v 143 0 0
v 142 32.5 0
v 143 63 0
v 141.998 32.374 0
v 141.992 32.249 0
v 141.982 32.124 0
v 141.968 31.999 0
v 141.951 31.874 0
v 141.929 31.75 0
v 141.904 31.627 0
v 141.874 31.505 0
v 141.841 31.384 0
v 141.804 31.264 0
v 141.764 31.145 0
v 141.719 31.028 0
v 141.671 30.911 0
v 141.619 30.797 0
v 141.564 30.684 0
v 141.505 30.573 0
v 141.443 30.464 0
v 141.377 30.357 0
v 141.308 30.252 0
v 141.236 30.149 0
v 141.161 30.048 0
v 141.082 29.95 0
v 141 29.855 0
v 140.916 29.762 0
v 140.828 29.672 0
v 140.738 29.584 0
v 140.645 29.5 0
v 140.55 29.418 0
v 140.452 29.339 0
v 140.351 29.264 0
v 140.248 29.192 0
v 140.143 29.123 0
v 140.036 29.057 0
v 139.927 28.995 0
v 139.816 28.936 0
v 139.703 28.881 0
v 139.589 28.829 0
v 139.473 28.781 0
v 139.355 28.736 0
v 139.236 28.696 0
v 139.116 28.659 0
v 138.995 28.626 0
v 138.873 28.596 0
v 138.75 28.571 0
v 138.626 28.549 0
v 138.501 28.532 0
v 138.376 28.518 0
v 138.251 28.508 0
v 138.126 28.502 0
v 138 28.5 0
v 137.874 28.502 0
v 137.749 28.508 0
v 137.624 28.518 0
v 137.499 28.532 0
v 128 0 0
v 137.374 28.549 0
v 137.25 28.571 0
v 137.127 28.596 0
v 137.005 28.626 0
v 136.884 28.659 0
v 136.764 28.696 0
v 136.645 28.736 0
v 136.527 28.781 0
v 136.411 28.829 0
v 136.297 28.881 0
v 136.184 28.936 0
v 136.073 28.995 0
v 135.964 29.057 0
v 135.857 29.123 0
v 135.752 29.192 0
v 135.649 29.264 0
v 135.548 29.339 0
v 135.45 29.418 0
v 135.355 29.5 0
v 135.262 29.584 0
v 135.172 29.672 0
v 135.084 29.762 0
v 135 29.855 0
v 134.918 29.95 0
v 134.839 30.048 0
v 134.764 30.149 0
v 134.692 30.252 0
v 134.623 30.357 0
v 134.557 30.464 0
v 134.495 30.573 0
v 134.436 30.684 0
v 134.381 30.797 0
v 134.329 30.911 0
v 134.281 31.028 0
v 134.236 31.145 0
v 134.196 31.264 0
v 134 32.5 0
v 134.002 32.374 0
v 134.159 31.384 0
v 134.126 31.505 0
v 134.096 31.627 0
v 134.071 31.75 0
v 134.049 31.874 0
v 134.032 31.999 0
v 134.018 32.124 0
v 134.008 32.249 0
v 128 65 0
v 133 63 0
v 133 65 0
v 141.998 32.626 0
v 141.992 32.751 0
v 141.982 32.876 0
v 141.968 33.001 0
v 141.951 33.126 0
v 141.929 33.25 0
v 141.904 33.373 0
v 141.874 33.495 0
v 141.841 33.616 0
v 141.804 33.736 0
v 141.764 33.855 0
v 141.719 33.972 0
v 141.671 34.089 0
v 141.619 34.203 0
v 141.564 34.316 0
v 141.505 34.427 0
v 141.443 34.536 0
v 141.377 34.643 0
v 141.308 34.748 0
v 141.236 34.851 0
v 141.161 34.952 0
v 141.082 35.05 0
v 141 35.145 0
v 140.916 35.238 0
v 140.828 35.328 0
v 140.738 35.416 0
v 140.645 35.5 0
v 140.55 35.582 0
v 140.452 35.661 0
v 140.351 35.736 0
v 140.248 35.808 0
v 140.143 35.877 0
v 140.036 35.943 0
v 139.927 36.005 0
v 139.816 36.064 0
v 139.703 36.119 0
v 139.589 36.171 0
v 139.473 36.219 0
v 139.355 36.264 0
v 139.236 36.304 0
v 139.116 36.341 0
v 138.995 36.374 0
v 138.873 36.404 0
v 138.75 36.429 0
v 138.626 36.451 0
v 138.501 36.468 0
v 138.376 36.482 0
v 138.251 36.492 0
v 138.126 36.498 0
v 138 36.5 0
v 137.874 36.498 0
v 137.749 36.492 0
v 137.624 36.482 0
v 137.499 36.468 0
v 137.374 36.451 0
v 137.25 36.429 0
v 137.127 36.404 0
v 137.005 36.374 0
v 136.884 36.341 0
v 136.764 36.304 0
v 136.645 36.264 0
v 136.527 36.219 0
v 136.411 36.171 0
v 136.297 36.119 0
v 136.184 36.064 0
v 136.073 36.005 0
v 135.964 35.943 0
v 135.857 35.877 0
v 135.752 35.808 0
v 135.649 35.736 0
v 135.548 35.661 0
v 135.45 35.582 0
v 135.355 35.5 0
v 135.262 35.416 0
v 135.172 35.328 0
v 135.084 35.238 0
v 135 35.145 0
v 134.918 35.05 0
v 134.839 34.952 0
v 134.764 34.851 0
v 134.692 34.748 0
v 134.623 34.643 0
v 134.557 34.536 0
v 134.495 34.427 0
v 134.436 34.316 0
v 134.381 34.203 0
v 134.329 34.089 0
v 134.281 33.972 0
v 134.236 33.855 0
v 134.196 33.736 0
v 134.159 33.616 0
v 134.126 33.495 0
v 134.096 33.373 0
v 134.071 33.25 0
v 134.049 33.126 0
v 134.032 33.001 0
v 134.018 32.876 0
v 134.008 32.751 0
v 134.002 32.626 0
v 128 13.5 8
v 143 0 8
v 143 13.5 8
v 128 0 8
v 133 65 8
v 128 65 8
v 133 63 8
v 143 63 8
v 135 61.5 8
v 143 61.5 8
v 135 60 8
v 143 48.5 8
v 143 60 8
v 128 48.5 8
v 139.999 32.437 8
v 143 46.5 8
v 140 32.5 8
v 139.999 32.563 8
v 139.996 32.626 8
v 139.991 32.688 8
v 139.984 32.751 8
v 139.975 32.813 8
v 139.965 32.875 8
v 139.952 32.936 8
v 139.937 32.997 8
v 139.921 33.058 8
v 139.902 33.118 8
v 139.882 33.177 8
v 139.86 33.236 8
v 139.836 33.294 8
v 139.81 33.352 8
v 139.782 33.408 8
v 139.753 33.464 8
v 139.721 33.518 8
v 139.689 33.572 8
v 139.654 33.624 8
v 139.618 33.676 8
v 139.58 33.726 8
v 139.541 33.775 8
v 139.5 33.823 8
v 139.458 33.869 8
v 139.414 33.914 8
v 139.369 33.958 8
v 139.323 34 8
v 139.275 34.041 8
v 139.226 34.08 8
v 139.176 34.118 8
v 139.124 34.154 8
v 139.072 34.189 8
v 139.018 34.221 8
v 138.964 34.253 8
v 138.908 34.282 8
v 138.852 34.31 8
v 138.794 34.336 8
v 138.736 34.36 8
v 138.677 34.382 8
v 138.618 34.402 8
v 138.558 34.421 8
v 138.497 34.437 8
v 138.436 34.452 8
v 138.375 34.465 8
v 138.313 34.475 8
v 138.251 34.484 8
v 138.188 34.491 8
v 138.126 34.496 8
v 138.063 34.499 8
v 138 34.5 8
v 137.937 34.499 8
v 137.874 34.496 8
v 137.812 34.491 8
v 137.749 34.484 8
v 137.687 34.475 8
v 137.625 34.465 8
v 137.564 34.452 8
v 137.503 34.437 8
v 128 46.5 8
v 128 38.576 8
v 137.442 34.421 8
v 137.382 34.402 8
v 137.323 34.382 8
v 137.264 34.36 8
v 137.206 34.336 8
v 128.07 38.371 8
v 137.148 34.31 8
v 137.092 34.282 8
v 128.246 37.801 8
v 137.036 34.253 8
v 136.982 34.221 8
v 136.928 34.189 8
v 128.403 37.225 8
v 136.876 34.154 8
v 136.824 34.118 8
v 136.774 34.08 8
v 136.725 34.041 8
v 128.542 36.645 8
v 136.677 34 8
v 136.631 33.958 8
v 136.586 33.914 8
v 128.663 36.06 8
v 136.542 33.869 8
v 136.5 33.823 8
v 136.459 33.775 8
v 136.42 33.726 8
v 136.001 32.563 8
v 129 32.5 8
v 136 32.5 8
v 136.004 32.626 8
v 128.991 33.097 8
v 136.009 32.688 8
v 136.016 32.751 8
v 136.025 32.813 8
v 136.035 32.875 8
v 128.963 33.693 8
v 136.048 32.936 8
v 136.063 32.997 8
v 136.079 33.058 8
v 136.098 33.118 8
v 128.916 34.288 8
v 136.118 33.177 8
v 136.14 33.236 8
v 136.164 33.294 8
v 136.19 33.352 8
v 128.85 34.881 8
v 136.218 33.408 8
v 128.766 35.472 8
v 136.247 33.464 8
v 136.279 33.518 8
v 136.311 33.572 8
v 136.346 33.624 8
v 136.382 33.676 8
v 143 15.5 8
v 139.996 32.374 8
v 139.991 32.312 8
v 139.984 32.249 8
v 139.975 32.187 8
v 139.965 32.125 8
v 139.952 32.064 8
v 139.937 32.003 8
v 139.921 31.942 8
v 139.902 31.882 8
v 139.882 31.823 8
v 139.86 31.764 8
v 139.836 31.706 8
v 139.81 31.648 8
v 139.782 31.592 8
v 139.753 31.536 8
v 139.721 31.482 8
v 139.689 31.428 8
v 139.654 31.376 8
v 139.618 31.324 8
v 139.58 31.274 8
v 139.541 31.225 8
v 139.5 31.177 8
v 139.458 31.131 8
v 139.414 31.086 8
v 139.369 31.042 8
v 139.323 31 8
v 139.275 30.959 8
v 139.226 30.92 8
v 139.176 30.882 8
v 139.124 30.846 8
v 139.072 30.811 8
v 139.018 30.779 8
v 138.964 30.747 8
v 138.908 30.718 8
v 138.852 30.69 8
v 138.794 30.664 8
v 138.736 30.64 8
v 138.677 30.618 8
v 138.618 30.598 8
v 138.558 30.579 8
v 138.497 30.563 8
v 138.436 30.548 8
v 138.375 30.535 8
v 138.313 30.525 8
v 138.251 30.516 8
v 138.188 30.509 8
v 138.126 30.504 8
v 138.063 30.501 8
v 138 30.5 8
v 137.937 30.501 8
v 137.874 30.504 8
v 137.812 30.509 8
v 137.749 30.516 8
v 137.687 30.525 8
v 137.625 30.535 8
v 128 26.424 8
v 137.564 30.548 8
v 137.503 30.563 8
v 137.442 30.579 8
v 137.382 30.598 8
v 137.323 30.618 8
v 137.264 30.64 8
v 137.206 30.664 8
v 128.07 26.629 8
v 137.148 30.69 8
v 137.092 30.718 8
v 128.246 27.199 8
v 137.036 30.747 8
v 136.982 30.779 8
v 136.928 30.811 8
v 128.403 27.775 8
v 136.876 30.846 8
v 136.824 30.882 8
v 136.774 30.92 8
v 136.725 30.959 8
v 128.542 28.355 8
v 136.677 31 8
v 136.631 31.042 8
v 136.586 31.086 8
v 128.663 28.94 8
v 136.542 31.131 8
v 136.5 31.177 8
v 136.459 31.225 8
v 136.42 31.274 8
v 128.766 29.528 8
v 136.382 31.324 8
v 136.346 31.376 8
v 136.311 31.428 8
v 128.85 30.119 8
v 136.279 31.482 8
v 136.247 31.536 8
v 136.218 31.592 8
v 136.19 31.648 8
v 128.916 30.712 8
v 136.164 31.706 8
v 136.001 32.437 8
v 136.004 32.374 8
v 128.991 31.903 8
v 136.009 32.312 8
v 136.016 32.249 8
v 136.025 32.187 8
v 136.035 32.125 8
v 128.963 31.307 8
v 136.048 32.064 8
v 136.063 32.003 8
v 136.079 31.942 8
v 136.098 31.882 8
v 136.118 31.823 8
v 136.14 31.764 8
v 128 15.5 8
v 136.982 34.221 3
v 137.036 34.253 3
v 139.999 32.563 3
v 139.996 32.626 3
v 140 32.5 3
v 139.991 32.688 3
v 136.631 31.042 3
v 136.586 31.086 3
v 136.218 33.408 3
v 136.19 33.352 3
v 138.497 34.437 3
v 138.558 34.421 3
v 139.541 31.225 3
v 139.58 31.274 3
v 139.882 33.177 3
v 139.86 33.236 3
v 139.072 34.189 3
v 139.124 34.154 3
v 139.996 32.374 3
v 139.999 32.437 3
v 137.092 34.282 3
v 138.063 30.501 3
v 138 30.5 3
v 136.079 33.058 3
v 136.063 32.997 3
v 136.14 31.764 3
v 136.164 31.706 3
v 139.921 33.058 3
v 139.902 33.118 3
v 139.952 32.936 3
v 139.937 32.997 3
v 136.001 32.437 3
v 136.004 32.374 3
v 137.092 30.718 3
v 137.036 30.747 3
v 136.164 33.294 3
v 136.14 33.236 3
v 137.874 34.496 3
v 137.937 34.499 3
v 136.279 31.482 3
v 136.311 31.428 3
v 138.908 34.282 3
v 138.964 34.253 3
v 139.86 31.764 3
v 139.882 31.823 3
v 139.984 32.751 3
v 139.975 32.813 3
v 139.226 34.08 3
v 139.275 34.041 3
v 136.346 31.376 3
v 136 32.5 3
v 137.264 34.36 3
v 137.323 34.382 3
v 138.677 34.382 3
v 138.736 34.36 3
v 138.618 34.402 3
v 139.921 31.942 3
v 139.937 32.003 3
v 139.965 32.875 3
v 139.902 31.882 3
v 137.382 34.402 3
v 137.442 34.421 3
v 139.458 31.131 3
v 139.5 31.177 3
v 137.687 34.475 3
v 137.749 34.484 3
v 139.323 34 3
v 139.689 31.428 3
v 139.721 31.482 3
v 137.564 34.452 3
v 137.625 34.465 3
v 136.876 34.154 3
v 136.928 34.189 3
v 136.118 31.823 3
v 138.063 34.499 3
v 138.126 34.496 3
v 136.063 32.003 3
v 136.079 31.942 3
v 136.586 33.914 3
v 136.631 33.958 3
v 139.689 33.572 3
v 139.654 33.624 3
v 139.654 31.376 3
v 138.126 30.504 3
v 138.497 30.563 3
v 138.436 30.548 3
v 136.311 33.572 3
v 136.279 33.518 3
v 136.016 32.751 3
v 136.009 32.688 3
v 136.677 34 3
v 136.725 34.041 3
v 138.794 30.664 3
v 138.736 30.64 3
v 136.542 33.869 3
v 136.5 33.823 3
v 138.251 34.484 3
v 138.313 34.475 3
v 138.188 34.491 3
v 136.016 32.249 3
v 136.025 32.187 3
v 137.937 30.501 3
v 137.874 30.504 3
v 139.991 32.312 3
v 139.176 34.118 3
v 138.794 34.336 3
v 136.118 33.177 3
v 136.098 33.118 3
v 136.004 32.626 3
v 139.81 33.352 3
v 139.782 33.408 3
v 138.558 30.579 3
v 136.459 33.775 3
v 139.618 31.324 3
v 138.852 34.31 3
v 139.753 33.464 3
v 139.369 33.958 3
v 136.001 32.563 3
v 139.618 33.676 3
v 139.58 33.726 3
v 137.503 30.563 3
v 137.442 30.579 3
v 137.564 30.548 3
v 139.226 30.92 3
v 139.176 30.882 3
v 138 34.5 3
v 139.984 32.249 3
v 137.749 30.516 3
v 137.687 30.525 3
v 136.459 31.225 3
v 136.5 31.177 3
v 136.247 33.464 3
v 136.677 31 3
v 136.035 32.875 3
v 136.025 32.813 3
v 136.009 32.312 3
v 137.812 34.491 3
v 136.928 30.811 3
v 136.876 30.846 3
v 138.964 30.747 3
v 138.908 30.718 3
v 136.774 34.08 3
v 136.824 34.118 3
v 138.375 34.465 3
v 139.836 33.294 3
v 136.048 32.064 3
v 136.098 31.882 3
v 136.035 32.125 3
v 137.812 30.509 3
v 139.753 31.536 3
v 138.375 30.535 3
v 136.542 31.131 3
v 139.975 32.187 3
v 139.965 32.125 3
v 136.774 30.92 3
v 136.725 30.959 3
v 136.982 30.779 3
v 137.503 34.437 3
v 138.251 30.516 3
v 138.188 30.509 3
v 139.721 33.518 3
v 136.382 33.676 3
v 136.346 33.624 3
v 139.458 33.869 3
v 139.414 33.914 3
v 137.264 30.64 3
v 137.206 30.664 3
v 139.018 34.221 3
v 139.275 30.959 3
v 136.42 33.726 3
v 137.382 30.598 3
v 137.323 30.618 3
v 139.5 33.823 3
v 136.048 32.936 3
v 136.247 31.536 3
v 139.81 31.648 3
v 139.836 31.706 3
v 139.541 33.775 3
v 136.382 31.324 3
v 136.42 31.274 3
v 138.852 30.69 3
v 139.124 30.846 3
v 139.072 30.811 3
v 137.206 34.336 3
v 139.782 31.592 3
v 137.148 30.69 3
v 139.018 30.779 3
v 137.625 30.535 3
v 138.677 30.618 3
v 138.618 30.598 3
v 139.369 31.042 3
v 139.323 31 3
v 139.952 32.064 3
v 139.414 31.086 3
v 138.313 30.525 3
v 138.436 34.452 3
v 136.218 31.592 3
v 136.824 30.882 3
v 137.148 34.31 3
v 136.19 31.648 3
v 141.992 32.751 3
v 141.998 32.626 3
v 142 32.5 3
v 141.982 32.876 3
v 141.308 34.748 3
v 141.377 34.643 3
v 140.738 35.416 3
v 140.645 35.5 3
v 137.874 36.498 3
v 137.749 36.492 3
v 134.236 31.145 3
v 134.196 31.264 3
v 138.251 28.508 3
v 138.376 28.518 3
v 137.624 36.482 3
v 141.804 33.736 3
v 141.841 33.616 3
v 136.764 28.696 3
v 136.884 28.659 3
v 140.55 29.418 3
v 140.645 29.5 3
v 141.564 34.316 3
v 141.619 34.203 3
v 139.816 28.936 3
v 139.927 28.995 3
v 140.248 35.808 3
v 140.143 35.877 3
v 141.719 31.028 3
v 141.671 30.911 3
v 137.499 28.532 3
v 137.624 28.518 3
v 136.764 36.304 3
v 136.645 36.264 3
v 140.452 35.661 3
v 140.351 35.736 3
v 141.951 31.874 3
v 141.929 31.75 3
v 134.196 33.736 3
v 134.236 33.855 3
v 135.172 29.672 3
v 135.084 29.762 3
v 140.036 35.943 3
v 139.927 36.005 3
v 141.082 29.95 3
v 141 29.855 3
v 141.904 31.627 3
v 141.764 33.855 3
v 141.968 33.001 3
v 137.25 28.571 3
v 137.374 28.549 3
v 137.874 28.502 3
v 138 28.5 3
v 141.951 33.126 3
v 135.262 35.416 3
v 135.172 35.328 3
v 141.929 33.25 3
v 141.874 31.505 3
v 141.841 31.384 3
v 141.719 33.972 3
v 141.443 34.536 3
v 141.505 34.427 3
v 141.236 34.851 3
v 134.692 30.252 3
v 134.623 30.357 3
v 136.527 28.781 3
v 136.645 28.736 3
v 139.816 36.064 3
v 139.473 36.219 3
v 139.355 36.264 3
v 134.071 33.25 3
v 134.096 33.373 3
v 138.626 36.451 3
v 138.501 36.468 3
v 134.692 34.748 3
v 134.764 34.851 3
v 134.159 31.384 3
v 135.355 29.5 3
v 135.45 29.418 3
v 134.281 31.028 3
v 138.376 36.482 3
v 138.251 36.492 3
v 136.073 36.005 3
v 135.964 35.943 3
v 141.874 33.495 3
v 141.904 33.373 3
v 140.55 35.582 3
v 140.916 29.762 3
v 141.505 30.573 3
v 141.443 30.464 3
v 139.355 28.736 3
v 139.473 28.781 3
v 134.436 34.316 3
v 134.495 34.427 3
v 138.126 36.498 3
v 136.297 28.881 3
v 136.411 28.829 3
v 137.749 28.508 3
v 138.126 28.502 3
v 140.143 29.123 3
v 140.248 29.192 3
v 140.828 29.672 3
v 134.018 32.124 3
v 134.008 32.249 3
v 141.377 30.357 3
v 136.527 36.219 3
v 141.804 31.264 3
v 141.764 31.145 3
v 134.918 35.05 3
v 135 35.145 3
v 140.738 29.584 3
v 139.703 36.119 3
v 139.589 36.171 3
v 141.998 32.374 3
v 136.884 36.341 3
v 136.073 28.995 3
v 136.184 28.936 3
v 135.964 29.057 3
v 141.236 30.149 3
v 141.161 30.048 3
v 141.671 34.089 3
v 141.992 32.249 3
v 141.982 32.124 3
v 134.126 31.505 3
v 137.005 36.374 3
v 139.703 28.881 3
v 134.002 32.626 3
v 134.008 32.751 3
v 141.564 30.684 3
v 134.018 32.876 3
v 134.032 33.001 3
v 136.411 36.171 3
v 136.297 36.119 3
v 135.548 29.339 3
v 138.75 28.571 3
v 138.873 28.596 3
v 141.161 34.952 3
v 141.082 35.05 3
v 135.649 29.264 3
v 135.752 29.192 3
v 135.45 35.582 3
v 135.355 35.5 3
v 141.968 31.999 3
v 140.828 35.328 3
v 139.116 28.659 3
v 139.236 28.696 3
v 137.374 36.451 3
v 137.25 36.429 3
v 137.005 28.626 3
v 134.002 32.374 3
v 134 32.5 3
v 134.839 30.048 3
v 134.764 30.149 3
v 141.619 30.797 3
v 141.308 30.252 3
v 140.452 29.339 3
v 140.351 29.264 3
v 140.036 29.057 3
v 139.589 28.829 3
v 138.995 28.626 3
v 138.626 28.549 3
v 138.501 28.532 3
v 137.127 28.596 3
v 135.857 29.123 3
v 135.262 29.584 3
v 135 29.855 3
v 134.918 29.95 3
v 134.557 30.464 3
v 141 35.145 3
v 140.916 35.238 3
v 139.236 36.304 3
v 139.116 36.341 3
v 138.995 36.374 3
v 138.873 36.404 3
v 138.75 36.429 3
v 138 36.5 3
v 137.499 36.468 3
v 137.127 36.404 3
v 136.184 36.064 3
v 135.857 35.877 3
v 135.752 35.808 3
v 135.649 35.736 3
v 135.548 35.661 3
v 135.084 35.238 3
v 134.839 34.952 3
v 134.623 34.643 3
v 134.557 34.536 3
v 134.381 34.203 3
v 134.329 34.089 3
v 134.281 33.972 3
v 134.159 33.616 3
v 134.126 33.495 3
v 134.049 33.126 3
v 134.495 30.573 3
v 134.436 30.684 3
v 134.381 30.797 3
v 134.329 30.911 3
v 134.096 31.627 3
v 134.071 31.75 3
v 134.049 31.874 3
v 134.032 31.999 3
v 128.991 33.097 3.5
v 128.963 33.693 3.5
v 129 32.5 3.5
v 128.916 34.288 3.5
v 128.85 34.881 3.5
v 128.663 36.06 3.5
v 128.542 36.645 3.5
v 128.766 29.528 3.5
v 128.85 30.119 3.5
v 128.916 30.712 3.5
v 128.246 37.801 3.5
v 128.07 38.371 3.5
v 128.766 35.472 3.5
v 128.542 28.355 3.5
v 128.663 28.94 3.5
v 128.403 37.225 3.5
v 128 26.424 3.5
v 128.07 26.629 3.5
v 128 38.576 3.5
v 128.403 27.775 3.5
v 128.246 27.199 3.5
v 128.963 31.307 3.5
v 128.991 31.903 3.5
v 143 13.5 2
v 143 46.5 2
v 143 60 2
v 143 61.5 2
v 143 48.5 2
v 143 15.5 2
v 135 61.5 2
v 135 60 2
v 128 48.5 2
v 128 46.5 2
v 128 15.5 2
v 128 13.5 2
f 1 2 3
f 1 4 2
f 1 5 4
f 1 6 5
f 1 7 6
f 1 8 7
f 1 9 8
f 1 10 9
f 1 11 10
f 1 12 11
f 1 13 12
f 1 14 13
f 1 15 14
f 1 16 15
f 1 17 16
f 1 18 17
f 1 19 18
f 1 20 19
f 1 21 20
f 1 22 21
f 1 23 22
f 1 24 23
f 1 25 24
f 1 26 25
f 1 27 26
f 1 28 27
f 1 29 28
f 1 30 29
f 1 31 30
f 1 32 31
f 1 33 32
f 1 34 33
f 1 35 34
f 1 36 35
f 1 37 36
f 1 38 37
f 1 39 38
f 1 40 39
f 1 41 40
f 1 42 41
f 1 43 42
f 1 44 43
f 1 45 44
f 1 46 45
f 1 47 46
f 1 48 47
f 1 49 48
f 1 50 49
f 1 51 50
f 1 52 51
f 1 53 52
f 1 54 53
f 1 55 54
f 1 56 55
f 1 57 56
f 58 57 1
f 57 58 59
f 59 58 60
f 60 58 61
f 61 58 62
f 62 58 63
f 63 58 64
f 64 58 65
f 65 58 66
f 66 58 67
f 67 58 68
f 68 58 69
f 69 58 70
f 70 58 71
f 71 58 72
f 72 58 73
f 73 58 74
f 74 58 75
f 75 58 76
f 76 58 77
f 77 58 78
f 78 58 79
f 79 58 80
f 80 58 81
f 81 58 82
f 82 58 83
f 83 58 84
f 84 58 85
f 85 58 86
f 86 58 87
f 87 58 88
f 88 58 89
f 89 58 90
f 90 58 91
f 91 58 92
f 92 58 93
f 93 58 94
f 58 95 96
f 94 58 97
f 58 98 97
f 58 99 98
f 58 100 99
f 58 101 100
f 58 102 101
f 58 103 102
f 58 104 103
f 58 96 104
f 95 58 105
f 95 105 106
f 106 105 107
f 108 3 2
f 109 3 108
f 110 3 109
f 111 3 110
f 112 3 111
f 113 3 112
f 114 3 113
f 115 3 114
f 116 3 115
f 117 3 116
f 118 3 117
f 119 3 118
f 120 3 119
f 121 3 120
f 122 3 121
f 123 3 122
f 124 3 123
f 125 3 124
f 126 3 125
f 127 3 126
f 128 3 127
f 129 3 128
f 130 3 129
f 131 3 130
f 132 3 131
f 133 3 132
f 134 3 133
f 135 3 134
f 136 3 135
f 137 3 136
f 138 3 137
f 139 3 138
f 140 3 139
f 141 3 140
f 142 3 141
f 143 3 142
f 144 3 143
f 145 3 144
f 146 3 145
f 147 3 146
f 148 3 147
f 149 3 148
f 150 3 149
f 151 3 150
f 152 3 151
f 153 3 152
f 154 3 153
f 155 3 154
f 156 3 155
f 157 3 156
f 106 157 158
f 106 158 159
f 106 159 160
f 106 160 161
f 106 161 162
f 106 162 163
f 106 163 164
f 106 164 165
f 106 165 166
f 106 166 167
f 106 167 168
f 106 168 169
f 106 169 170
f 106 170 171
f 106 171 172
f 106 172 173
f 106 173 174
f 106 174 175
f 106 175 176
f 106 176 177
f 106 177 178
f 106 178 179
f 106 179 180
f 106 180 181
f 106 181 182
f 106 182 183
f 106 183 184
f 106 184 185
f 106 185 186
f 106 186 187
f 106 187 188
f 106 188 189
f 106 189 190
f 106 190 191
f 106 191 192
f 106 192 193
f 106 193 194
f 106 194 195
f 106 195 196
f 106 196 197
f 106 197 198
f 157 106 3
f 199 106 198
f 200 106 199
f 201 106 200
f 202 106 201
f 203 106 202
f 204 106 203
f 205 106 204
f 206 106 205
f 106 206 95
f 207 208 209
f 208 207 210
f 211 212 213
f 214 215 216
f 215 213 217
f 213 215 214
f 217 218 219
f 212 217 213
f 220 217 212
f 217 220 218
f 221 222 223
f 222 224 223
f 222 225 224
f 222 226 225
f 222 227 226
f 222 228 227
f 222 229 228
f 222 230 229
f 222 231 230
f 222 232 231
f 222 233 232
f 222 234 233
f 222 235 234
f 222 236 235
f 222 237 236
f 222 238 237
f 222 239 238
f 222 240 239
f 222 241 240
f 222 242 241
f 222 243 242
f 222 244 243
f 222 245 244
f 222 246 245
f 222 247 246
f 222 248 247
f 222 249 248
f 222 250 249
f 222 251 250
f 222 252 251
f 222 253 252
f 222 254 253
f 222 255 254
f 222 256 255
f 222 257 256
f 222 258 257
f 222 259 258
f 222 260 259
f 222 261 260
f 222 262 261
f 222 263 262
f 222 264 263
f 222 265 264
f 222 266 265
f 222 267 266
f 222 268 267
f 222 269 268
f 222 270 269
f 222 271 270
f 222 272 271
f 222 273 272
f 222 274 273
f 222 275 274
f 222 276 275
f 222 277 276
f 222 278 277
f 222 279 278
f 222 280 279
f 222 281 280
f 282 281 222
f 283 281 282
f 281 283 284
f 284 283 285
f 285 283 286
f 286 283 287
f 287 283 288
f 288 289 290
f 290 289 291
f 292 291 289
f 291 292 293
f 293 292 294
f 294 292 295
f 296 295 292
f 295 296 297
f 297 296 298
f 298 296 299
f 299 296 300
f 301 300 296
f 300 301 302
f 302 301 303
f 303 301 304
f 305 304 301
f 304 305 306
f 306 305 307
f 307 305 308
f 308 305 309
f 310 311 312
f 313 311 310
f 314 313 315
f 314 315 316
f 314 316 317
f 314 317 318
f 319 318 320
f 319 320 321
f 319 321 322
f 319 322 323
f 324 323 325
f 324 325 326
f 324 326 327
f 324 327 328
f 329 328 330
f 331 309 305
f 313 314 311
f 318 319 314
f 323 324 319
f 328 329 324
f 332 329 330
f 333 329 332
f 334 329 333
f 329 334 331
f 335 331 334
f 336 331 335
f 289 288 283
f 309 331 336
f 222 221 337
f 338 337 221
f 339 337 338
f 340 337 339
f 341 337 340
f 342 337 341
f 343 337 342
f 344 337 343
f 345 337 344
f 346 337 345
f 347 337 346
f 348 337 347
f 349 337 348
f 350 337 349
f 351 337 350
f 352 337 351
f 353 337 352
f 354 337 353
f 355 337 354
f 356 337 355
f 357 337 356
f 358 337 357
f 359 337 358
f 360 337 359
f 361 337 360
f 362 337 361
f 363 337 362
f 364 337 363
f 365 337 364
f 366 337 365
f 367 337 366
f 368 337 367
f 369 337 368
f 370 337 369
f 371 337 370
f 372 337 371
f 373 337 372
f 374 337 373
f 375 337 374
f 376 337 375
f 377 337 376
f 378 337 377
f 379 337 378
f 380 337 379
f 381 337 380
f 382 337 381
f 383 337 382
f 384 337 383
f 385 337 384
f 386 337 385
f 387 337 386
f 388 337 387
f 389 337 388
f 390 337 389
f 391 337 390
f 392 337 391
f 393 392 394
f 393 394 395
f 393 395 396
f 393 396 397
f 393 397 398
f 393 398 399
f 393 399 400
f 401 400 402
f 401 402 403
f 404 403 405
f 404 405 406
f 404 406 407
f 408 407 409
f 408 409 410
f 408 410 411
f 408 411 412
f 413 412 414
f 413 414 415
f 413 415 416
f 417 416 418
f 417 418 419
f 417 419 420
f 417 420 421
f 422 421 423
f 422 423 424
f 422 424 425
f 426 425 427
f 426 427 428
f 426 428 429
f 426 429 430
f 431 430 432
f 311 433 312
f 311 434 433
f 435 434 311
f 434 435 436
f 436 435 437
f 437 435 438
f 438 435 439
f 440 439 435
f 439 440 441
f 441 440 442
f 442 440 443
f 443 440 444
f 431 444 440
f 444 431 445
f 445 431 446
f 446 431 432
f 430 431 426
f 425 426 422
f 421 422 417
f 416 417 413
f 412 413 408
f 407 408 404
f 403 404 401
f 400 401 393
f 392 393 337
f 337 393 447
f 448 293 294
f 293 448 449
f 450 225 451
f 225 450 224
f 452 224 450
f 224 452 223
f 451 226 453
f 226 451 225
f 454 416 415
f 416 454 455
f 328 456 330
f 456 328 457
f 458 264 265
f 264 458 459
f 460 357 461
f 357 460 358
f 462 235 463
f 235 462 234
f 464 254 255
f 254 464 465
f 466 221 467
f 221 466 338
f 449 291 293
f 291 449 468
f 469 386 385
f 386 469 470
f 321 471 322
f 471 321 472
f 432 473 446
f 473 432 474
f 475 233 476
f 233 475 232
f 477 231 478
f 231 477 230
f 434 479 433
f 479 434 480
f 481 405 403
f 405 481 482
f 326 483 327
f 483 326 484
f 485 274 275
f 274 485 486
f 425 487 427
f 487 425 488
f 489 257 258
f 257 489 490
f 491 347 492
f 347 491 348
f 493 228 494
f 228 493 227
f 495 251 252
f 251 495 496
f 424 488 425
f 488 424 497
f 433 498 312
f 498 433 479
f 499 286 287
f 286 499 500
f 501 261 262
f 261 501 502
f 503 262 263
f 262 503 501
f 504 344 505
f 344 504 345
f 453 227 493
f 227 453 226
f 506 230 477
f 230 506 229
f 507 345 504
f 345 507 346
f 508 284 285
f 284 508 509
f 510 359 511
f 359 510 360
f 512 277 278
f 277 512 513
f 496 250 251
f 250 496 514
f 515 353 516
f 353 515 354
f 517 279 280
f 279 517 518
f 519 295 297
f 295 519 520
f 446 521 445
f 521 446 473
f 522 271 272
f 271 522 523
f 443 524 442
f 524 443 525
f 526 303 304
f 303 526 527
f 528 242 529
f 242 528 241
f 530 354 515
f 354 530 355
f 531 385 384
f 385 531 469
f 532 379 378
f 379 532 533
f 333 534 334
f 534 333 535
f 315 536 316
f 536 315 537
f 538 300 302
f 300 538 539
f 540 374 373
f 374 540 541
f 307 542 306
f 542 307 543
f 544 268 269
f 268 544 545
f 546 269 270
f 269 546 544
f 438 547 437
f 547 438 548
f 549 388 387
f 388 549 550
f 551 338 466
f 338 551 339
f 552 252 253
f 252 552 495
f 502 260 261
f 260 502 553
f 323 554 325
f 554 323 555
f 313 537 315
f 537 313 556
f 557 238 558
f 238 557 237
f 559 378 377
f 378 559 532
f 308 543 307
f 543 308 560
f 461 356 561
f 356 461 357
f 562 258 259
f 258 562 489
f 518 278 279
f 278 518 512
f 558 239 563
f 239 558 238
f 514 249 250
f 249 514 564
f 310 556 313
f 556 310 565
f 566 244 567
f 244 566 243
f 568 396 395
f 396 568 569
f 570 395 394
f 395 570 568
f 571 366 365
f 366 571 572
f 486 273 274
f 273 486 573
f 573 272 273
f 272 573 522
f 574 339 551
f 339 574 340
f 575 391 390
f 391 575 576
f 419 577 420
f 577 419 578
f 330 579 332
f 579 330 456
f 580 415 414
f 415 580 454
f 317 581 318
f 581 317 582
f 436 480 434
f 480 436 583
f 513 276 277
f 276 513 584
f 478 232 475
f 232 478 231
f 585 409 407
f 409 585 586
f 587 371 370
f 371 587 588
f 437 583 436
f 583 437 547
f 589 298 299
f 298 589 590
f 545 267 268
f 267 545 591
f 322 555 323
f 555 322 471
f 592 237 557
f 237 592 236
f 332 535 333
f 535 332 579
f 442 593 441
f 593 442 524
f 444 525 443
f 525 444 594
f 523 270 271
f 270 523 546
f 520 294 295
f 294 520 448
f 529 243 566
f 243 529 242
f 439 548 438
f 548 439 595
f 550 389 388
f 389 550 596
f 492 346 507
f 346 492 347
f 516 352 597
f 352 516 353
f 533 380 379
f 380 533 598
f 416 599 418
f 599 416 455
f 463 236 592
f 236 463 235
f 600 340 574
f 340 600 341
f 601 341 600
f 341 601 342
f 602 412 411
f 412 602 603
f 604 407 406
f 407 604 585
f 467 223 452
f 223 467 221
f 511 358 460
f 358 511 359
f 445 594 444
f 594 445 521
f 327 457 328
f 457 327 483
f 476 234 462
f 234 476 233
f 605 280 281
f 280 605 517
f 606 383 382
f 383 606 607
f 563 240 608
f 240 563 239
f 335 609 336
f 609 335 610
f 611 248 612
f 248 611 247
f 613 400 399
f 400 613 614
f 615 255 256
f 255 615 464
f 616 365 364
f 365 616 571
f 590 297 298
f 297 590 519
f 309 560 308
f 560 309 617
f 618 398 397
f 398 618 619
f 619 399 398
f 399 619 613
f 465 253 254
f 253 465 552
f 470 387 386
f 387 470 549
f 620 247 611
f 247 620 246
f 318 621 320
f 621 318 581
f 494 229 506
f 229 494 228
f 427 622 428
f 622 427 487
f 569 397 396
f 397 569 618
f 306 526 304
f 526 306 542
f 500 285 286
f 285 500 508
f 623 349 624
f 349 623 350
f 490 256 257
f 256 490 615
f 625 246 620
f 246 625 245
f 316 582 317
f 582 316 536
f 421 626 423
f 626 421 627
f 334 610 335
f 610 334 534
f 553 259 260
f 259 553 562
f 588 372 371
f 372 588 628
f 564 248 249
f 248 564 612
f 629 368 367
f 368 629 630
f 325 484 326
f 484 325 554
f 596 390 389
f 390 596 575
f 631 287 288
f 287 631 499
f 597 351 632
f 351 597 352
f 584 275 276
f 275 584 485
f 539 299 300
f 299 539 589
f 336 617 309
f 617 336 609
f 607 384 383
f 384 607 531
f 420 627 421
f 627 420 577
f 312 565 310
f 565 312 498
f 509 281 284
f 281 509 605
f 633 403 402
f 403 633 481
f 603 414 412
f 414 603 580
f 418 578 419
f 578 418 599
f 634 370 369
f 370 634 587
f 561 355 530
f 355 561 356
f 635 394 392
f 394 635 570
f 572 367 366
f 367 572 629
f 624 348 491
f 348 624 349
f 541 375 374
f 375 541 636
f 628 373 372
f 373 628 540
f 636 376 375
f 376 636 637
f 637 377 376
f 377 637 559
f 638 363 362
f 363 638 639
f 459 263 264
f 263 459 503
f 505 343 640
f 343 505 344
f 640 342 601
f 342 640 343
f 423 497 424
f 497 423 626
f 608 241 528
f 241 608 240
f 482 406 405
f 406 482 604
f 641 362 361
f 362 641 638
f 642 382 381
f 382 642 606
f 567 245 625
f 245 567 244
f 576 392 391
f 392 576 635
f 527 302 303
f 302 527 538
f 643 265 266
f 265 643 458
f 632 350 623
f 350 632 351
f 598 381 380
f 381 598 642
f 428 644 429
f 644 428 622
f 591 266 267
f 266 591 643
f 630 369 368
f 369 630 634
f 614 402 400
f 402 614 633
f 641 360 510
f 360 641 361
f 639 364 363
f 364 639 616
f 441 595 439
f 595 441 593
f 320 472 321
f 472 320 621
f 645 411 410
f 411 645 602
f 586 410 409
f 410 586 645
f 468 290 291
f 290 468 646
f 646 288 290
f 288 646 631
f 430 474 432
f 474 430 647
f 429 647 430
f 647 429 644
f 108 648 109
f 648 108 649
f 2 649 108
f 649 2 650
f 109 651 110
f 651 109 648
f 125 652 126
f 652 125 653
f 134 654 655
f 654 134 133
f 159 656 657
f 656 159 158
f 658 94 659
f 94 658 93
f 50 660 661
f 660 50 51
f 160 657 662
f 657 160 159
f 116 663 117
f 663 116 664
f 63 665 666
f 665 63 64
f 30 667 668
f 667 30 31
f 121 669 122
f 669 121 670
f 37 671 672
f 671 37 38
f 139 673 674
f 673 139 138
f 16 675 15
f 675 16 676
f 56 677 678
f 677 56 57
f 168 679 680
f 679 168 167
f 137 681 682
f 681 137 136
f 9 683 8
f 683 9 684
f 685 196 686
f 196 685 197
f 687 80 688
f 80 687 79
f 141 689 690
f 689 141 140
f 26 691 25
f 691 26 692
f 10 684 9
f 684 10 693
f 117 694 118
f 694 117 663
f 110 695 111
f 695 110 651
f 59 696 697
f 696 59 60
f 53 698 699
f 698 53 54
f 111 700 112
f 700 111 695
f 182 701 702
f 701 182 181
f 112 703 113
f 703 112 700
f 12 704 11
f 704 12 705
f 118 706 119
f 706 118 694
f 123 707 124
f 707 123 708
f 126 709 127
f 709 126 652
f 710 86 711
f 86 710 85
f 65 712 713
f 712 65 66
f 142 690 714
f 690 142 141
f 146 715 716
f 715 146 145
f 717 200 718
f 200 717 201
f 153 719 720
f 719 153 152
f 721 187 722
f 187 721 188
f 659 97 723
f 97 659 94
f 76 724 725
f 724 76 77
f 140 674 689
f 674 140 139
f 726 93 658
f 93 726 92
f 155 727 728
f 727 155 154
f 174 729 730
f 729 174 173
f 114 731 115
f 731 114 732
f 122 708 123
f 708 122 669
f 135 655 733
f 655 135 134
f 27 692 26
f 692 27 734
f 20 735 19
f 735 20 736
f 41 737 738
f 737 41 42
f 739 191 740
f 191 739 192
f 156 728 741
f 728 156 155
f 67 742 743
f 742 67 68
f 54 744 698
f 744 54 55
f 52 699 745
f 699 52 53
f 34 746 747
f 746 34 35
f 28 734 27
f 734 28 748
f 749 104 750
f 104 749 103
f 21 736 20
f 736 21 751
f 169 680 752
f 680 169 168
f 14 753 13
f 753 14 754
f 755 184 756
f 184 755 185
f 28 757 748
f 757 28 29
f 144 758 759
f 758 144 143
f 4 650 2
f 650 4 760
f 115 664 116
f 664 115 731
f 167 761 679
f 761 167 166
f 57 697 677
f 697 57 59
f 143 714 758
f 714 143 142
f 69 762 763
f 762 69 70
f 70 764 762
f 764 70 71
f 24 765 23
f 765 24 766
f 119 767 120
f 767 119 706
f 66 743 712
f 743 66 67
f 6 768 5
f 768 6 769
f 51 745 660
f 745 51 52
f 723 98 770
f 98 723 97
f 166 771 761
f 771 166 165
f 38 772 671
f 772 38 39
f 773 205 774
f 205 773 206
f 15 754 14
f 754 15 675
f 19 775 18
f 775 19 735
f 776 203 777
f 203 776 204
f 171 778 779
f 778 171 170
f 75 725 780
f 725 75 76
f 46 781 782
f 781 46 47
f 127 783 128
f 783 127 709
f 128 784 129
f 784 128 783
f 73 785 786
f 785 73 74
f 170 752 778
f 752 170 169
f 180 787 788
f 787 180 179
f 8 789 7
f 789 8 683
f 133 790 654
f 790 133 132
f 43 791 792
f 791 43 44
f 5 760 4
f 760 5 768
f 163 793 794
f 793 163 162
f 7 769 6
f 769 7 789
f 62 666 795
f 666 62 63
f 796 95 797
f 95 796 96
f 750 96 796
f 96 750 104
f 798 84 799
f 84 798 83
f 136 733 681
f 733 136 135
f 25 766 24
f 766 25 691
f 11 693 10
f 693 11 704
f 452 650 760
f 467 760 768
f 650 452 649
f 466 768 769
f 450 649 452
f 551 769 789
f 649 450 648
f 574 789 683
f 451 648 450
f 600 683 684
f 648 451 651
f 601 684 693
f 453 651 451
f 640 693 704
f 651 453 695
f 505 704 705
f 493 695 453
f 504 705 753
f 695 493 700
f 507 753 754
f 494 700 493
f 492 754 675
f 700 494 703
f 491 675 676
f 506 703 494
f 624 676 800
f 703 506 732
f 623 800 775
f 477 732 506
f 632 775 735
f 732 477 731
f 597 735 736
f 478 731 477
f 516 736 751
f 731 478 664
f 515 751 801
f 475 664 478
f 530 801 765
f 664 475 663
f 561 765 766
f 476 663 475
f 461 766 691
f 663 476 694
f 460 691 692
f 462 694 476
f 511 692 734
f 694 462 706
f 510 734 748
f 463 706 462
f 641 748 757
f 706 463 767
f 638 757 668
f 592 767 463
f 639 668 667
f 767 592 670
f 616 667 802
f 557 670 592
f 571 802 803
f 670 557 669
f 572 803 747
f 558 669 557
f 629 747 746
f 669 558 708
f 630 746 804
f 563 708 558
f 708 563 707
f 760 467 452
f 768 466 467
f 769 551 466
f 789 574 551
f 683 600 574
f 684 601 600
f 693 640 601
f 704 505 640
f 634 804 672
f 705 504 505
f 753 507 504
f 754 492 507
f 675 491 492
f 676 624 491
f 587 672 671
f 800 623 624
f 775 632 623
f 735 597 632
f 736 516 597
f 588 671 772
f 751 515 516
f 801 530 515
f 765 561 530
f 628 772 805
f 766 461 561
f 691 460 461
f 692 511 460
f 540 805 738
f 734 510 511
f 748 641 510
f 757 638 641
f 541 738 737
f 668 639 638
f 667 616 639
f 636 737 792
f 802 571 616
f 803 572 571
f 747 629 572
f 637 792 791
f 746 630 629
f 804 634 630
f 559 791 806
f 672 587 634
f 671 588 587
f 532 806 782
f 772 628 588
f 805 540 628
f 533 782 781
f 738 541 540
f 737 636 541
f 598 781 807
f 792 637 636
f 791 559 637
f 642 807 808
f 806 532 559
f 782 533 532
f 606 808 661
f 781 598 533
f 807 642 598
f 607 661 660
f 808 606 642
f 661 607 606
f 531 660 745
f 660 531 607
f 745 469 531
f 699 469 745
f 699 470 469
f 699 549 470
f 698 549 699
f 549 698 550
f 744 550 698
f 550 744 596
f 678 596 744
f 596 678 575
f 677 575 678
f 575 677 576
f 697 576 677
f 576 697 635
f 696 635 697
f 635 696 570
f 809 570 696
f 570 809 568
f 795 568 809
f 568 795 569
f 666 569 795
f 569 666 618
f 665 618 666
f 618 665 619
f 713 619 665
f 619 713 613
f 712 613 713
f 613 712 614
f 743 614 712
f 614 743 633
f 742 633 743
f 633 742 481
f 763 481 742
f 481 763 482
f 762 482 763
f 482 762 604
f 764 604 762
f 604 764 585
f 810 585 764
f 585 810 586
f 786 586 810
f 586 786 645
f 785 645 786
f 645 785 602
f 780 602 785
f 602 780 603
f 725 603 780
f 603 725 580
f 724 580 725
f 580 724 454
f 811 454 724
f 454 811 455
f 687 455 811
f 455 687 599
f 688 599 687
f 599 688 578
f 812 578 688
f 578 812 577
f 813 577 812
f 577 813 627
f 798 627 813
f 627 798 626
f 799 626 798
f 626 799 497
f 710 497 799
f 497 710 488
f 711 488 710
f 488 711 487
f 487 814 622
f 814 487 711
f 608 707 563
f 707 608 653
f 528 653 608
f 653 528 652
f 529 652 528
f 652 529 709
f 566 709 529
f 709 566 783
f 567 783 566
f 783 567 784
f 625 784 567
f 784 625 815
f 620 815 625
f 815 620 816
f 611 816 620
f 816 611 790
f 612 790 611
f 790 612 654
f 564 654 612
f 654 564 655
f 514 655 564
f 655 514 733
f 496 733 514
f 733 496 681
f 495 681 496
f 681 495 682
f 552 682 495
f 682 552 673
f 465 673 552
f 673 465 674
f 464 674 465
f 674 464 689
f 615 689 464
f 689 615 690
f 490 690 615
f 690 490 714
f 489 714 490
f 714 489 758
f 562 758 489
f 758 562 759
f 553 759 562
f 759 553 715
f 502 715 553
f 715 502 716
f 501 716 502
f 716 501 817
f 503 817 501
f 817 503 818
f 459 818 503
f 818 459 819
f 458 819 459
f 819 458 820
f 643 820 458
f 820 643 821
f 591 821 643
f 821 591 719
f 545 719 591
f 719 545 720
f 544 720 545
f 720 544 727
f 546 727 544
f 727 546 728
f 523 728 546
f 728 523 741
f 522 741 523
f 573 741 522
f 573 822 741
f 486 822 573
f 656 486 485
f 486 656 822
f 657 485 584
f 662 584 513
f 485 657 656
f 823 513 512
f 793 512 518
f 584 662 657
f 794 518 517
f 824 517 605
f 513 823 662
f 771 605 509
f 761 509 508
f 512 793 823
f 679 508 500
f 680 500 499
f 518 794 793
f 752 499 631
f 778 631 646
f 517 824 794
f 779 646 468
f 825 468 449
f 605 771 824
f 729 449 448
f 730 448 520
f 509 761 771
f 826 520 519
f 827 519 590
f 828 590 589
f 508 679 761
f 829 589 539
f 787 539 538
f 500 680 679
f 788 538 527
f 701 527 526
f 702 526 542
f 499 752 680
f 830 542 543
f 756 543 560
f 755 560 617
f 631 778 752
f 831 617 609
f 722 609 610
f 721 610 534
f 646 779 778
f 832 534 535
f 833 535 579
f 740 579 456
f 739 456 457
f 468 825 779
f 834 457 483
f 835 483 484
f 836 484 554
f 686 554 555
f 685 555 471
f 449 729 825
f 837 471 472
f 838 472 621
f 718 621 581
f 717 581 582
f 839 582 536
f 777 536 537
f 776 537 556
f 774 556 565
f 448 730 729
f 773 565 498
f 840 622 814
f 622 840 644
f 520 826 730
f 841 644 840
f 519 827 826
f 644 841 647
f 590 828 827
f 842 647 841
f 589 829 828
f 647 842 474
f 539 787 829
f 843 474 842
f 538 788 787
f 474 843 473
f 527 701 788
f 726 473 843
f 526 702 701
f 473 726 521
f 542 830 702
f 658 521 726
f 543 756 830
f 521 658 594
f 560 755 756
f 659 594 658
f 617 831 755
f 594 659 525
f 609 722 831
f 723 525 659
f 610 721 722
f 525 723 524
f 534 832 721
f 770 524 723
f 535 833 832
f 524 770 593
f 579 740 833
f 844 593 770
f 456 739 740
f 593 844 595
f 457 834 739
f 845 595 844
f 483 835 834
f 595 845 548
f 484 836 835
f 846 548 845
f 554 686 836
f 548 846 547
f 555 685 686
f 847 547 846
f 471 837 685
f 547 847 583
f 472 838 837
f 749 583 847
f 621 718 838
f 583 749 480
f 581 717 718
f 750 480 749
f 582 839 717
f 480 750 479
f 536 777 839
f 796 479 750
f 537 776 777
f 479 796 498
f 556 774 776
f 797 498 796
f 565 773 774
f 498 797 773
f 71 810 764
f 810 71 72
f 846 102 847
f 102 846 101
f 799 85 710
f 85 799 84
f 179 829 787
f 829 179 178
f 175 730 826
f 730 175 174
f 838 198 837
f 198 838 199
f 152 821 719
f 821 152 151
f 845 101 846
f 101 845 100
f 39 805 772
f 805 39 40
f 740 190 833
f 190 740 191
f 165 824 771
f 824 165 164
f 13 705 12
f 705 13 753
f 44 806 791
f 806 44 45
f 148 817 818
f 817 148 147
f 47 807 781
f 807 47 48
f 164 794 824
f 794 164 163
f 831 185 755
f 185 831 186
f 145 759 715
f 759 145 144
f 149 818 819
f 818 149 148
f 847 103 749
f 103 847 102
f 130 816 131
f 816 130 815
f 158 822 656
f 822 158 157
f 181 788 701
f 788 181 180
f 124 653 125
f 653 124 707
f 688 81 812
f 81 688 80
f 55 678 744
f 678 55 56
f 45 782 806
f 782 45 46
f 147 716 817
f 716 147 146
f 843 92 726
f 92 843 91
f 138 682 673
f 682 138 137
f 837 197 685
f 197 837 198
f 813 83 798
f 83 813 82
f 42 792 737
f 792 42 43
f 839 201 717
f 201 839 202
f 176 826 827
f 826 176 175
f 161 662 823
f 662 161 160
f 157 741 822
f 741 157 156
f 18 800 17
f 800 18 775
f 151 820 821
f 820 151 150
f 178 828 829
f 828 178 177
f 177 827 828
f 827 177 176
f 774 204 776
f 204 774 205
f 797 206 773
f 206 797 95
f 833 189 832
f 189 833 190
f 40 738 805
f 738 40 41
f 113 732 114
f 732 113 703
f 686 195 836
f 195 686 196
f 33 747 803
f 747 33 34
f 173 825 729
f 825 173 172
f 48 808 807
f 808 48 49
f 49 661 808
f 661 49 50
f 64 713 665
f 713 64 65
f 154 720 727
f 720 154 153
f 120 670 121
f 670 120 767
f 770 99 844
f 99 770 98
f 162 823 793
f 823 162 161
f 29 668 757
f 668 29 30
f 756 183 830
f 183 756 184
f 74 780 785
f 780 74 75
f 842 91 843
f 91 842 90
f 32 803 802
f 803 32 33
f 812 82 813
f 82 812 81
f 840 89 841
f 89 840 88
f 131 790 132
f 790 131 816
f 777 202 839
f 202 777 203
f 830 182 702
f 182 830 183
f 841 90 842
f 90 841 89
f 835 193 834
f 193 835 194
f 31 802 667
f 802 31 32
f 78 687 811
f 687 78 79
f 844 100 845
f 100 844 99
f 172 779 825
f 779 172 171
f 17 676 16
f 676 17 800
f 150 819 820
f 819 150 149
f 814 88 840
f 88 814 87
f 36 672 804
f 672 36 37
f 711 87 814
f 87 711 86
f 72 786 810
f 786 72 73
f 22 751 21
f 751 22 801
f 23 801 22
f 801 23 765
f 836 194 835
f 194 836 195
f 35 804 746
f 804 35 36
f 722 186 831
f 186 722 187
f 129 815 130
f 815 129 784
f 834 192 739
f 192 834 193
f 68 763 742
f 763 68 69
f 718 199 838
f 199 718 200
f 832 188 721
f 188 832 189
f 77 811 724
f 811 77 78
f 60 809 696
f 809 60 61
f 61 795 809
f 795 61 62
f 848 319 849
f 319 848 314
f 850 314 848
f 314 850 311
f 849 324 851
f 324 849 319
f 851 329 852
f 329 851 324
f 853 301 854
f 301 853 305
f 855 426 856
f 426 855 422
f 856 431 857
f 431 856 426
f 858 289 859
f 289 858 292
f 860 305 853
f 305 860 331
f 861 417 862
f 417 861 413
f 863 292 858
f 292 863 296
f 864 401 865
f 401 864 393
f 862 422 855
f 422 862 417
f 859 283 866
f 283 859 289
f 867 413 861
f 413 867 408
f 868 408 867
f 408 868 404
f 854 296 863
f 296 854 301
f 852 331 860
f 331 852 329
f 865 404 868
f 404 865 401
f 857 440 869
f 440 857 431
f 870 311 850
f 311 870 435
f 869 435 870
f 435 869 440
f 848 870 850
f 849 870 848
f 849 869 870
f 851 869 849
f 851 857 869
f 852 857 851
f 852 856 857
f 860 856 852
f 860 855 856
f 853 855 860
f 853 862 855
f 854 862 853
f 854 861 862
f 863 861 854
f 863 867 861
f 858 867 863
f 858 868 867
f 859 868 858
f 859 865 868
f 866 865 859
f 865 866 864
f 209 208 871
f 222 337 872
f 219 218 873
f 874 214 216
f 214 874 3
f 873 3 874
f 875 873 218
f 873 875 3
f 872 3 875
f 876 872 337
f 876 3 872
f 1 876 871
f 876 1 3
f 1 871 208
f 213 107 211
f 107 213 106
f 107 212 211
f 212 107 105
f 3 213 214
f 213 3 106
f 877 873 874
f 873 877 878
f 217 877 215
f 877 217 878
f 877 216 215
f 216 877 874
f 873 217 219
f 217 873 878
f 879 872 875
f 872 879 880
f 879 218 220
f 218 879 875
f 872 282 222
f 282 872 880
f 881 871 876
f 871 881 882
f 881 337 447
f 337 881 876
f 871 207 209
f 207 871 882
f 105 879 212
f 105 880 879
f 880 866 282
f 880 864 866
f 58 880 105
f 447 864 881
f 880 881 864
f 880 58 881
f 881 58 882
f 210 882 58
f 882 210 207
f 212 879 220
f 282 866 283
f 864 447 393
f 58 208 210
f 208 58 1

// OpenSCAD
$fn = 200;

// Ideal panel width was 115mm
// but cut was outside marking
// so is actually 143mm wide with 9mm overlap.
// If you cut yours correctly reduce this.
// Excludes possible fixing to wooden door.
PanelWidth = 143; // mm Actylic panel only. 

// Offset from left/right side for the mounting holes on the panel
MountingHolesOffset = 5;

// Height of the Acrylic panel
// need to exclude top 12-15mm for unit overlap. 
// Botton has rounded corners.
PanelHeight = 151; // mm

NeoPixelRingOuterDiameter = 38; // mm
NeoPixelRingInnerDiameter = 23; // mm

Height = NeoPixelRingOuterDiameter + 10 + 17; // 5mm top/bottom.
Depth = 8; // mm

NeoPixelXPosition = 110; 
NeoPixelYPosition = Height / 2; //24mm from the top. // Height / 2;
NeoPixelHeight = 4.5; // mm - includes wires (& probably hotmelt)

module frontPanelInsert() {
    difference() {
        union() {
            cube([PanelWidth, Height, Depth]);
        }
        union() {
            // Mounting holes
            translate([MountingHolesOffset, Height/2, 0]) {
                cylinder(d=4, h=Depth, centre=true);
                cylinder(d=8, h=3, centre=true);
            }
            translate([PanelWidth-MountingHolesOffset, Height/2, 0]) {
                cylinder(d=4, h=Depth, centre=true);
                cylinder(d=8, h=3, centre=true);
            }
           
            
            // Hole through the block for light to come through the center of the NeoPixel Display
            translate([NeoPixelXPosition, NeoPixelYPosition, 0]) {
                cylinder(d=NeoPixelRingInnerDiameter, h=Depth, centre=true);
                
                translate([0,0, Depth-NeoPixelHeight]) {
                    cylinder(d=NeoPixelRingOuterDiameter, h=NeoPixelHeight, centre=true);
                }
            }
            
            // Pocket for NeoPixel ring to sit in.
            
            // Channels for wires to escape from NeoPixels.
            // 2mm from top, exit to the right of the neo pixels
            translate([NeoPixelXPosition, NeoPixelYPosition + (NeoPixelRingOuterDiameter/2)-2-3, 2]) { 
                // Din/DOut wires.
                cube([PanelWidth - NeoPixelXPosition, 2, Depth-2]);
            }
            
            translate([NeoPixelXPosition, NeoPixelYPosition - (NeoPixelRingOuterDiameter/2), 2]) { 
                // +Ve and GND
                cube([PanelWidth - NeoPixelXPosition, 2, Depth-2]);
            }
            
            // Oval cutout to look like Form1.
            translate([30, NeoPixelYPosition, 0]) {
                cylinder(d=NeoPixelRingOuterDiameter, h=Depth, centre=true);
                
                translate([0,-(NeoPixelRingOuterDiameter/2), 0]) {
                    cube([35 ,NeoPixelRingOuterDiameter,Depth]);
                }
                
                translate([35,0, 0]) {
                    cylinder(d=NeoPixelRingOuterDiameter, h=Depth, centre=true);
                }
            }
            
            // cut out for Hall Effect door sensor.
            magnetHeightAllowance = 2; // mm
            translate([PanelWidth-10, Height-magnetHeightAllowance, 0]) {
                // Cut out all the way trough to allow for the magnet offset from 
                // the lid of the unit.
                #cube([10, magnetHeightAllowance, 10]);
                
                // Make a pocket for the hall effect device.
                // Move in slightly to allow for x-axis error on magnet alignment.
                // Move down slightly to allow for a wall on the panel
                // Move up down so as to not cut all the way through the panel.
                // and mount it at the back of the panel
                translate([2, -3, 2]) {
                    // Hall effect is about 1.6mm deep
                    #cube([10, 1.5, Depth-2]);
                }
            }
            
            // DEGUB!
            // Chop out most of the panel to get just the hall effect section
            // in order to test print
            cube([PanelWidth-15, Height, Depth]);
        }
    }
}

frontPanelInsert();

// For SVG explort

projection( cut=false ) {
//    frontPanelInsert();
}
